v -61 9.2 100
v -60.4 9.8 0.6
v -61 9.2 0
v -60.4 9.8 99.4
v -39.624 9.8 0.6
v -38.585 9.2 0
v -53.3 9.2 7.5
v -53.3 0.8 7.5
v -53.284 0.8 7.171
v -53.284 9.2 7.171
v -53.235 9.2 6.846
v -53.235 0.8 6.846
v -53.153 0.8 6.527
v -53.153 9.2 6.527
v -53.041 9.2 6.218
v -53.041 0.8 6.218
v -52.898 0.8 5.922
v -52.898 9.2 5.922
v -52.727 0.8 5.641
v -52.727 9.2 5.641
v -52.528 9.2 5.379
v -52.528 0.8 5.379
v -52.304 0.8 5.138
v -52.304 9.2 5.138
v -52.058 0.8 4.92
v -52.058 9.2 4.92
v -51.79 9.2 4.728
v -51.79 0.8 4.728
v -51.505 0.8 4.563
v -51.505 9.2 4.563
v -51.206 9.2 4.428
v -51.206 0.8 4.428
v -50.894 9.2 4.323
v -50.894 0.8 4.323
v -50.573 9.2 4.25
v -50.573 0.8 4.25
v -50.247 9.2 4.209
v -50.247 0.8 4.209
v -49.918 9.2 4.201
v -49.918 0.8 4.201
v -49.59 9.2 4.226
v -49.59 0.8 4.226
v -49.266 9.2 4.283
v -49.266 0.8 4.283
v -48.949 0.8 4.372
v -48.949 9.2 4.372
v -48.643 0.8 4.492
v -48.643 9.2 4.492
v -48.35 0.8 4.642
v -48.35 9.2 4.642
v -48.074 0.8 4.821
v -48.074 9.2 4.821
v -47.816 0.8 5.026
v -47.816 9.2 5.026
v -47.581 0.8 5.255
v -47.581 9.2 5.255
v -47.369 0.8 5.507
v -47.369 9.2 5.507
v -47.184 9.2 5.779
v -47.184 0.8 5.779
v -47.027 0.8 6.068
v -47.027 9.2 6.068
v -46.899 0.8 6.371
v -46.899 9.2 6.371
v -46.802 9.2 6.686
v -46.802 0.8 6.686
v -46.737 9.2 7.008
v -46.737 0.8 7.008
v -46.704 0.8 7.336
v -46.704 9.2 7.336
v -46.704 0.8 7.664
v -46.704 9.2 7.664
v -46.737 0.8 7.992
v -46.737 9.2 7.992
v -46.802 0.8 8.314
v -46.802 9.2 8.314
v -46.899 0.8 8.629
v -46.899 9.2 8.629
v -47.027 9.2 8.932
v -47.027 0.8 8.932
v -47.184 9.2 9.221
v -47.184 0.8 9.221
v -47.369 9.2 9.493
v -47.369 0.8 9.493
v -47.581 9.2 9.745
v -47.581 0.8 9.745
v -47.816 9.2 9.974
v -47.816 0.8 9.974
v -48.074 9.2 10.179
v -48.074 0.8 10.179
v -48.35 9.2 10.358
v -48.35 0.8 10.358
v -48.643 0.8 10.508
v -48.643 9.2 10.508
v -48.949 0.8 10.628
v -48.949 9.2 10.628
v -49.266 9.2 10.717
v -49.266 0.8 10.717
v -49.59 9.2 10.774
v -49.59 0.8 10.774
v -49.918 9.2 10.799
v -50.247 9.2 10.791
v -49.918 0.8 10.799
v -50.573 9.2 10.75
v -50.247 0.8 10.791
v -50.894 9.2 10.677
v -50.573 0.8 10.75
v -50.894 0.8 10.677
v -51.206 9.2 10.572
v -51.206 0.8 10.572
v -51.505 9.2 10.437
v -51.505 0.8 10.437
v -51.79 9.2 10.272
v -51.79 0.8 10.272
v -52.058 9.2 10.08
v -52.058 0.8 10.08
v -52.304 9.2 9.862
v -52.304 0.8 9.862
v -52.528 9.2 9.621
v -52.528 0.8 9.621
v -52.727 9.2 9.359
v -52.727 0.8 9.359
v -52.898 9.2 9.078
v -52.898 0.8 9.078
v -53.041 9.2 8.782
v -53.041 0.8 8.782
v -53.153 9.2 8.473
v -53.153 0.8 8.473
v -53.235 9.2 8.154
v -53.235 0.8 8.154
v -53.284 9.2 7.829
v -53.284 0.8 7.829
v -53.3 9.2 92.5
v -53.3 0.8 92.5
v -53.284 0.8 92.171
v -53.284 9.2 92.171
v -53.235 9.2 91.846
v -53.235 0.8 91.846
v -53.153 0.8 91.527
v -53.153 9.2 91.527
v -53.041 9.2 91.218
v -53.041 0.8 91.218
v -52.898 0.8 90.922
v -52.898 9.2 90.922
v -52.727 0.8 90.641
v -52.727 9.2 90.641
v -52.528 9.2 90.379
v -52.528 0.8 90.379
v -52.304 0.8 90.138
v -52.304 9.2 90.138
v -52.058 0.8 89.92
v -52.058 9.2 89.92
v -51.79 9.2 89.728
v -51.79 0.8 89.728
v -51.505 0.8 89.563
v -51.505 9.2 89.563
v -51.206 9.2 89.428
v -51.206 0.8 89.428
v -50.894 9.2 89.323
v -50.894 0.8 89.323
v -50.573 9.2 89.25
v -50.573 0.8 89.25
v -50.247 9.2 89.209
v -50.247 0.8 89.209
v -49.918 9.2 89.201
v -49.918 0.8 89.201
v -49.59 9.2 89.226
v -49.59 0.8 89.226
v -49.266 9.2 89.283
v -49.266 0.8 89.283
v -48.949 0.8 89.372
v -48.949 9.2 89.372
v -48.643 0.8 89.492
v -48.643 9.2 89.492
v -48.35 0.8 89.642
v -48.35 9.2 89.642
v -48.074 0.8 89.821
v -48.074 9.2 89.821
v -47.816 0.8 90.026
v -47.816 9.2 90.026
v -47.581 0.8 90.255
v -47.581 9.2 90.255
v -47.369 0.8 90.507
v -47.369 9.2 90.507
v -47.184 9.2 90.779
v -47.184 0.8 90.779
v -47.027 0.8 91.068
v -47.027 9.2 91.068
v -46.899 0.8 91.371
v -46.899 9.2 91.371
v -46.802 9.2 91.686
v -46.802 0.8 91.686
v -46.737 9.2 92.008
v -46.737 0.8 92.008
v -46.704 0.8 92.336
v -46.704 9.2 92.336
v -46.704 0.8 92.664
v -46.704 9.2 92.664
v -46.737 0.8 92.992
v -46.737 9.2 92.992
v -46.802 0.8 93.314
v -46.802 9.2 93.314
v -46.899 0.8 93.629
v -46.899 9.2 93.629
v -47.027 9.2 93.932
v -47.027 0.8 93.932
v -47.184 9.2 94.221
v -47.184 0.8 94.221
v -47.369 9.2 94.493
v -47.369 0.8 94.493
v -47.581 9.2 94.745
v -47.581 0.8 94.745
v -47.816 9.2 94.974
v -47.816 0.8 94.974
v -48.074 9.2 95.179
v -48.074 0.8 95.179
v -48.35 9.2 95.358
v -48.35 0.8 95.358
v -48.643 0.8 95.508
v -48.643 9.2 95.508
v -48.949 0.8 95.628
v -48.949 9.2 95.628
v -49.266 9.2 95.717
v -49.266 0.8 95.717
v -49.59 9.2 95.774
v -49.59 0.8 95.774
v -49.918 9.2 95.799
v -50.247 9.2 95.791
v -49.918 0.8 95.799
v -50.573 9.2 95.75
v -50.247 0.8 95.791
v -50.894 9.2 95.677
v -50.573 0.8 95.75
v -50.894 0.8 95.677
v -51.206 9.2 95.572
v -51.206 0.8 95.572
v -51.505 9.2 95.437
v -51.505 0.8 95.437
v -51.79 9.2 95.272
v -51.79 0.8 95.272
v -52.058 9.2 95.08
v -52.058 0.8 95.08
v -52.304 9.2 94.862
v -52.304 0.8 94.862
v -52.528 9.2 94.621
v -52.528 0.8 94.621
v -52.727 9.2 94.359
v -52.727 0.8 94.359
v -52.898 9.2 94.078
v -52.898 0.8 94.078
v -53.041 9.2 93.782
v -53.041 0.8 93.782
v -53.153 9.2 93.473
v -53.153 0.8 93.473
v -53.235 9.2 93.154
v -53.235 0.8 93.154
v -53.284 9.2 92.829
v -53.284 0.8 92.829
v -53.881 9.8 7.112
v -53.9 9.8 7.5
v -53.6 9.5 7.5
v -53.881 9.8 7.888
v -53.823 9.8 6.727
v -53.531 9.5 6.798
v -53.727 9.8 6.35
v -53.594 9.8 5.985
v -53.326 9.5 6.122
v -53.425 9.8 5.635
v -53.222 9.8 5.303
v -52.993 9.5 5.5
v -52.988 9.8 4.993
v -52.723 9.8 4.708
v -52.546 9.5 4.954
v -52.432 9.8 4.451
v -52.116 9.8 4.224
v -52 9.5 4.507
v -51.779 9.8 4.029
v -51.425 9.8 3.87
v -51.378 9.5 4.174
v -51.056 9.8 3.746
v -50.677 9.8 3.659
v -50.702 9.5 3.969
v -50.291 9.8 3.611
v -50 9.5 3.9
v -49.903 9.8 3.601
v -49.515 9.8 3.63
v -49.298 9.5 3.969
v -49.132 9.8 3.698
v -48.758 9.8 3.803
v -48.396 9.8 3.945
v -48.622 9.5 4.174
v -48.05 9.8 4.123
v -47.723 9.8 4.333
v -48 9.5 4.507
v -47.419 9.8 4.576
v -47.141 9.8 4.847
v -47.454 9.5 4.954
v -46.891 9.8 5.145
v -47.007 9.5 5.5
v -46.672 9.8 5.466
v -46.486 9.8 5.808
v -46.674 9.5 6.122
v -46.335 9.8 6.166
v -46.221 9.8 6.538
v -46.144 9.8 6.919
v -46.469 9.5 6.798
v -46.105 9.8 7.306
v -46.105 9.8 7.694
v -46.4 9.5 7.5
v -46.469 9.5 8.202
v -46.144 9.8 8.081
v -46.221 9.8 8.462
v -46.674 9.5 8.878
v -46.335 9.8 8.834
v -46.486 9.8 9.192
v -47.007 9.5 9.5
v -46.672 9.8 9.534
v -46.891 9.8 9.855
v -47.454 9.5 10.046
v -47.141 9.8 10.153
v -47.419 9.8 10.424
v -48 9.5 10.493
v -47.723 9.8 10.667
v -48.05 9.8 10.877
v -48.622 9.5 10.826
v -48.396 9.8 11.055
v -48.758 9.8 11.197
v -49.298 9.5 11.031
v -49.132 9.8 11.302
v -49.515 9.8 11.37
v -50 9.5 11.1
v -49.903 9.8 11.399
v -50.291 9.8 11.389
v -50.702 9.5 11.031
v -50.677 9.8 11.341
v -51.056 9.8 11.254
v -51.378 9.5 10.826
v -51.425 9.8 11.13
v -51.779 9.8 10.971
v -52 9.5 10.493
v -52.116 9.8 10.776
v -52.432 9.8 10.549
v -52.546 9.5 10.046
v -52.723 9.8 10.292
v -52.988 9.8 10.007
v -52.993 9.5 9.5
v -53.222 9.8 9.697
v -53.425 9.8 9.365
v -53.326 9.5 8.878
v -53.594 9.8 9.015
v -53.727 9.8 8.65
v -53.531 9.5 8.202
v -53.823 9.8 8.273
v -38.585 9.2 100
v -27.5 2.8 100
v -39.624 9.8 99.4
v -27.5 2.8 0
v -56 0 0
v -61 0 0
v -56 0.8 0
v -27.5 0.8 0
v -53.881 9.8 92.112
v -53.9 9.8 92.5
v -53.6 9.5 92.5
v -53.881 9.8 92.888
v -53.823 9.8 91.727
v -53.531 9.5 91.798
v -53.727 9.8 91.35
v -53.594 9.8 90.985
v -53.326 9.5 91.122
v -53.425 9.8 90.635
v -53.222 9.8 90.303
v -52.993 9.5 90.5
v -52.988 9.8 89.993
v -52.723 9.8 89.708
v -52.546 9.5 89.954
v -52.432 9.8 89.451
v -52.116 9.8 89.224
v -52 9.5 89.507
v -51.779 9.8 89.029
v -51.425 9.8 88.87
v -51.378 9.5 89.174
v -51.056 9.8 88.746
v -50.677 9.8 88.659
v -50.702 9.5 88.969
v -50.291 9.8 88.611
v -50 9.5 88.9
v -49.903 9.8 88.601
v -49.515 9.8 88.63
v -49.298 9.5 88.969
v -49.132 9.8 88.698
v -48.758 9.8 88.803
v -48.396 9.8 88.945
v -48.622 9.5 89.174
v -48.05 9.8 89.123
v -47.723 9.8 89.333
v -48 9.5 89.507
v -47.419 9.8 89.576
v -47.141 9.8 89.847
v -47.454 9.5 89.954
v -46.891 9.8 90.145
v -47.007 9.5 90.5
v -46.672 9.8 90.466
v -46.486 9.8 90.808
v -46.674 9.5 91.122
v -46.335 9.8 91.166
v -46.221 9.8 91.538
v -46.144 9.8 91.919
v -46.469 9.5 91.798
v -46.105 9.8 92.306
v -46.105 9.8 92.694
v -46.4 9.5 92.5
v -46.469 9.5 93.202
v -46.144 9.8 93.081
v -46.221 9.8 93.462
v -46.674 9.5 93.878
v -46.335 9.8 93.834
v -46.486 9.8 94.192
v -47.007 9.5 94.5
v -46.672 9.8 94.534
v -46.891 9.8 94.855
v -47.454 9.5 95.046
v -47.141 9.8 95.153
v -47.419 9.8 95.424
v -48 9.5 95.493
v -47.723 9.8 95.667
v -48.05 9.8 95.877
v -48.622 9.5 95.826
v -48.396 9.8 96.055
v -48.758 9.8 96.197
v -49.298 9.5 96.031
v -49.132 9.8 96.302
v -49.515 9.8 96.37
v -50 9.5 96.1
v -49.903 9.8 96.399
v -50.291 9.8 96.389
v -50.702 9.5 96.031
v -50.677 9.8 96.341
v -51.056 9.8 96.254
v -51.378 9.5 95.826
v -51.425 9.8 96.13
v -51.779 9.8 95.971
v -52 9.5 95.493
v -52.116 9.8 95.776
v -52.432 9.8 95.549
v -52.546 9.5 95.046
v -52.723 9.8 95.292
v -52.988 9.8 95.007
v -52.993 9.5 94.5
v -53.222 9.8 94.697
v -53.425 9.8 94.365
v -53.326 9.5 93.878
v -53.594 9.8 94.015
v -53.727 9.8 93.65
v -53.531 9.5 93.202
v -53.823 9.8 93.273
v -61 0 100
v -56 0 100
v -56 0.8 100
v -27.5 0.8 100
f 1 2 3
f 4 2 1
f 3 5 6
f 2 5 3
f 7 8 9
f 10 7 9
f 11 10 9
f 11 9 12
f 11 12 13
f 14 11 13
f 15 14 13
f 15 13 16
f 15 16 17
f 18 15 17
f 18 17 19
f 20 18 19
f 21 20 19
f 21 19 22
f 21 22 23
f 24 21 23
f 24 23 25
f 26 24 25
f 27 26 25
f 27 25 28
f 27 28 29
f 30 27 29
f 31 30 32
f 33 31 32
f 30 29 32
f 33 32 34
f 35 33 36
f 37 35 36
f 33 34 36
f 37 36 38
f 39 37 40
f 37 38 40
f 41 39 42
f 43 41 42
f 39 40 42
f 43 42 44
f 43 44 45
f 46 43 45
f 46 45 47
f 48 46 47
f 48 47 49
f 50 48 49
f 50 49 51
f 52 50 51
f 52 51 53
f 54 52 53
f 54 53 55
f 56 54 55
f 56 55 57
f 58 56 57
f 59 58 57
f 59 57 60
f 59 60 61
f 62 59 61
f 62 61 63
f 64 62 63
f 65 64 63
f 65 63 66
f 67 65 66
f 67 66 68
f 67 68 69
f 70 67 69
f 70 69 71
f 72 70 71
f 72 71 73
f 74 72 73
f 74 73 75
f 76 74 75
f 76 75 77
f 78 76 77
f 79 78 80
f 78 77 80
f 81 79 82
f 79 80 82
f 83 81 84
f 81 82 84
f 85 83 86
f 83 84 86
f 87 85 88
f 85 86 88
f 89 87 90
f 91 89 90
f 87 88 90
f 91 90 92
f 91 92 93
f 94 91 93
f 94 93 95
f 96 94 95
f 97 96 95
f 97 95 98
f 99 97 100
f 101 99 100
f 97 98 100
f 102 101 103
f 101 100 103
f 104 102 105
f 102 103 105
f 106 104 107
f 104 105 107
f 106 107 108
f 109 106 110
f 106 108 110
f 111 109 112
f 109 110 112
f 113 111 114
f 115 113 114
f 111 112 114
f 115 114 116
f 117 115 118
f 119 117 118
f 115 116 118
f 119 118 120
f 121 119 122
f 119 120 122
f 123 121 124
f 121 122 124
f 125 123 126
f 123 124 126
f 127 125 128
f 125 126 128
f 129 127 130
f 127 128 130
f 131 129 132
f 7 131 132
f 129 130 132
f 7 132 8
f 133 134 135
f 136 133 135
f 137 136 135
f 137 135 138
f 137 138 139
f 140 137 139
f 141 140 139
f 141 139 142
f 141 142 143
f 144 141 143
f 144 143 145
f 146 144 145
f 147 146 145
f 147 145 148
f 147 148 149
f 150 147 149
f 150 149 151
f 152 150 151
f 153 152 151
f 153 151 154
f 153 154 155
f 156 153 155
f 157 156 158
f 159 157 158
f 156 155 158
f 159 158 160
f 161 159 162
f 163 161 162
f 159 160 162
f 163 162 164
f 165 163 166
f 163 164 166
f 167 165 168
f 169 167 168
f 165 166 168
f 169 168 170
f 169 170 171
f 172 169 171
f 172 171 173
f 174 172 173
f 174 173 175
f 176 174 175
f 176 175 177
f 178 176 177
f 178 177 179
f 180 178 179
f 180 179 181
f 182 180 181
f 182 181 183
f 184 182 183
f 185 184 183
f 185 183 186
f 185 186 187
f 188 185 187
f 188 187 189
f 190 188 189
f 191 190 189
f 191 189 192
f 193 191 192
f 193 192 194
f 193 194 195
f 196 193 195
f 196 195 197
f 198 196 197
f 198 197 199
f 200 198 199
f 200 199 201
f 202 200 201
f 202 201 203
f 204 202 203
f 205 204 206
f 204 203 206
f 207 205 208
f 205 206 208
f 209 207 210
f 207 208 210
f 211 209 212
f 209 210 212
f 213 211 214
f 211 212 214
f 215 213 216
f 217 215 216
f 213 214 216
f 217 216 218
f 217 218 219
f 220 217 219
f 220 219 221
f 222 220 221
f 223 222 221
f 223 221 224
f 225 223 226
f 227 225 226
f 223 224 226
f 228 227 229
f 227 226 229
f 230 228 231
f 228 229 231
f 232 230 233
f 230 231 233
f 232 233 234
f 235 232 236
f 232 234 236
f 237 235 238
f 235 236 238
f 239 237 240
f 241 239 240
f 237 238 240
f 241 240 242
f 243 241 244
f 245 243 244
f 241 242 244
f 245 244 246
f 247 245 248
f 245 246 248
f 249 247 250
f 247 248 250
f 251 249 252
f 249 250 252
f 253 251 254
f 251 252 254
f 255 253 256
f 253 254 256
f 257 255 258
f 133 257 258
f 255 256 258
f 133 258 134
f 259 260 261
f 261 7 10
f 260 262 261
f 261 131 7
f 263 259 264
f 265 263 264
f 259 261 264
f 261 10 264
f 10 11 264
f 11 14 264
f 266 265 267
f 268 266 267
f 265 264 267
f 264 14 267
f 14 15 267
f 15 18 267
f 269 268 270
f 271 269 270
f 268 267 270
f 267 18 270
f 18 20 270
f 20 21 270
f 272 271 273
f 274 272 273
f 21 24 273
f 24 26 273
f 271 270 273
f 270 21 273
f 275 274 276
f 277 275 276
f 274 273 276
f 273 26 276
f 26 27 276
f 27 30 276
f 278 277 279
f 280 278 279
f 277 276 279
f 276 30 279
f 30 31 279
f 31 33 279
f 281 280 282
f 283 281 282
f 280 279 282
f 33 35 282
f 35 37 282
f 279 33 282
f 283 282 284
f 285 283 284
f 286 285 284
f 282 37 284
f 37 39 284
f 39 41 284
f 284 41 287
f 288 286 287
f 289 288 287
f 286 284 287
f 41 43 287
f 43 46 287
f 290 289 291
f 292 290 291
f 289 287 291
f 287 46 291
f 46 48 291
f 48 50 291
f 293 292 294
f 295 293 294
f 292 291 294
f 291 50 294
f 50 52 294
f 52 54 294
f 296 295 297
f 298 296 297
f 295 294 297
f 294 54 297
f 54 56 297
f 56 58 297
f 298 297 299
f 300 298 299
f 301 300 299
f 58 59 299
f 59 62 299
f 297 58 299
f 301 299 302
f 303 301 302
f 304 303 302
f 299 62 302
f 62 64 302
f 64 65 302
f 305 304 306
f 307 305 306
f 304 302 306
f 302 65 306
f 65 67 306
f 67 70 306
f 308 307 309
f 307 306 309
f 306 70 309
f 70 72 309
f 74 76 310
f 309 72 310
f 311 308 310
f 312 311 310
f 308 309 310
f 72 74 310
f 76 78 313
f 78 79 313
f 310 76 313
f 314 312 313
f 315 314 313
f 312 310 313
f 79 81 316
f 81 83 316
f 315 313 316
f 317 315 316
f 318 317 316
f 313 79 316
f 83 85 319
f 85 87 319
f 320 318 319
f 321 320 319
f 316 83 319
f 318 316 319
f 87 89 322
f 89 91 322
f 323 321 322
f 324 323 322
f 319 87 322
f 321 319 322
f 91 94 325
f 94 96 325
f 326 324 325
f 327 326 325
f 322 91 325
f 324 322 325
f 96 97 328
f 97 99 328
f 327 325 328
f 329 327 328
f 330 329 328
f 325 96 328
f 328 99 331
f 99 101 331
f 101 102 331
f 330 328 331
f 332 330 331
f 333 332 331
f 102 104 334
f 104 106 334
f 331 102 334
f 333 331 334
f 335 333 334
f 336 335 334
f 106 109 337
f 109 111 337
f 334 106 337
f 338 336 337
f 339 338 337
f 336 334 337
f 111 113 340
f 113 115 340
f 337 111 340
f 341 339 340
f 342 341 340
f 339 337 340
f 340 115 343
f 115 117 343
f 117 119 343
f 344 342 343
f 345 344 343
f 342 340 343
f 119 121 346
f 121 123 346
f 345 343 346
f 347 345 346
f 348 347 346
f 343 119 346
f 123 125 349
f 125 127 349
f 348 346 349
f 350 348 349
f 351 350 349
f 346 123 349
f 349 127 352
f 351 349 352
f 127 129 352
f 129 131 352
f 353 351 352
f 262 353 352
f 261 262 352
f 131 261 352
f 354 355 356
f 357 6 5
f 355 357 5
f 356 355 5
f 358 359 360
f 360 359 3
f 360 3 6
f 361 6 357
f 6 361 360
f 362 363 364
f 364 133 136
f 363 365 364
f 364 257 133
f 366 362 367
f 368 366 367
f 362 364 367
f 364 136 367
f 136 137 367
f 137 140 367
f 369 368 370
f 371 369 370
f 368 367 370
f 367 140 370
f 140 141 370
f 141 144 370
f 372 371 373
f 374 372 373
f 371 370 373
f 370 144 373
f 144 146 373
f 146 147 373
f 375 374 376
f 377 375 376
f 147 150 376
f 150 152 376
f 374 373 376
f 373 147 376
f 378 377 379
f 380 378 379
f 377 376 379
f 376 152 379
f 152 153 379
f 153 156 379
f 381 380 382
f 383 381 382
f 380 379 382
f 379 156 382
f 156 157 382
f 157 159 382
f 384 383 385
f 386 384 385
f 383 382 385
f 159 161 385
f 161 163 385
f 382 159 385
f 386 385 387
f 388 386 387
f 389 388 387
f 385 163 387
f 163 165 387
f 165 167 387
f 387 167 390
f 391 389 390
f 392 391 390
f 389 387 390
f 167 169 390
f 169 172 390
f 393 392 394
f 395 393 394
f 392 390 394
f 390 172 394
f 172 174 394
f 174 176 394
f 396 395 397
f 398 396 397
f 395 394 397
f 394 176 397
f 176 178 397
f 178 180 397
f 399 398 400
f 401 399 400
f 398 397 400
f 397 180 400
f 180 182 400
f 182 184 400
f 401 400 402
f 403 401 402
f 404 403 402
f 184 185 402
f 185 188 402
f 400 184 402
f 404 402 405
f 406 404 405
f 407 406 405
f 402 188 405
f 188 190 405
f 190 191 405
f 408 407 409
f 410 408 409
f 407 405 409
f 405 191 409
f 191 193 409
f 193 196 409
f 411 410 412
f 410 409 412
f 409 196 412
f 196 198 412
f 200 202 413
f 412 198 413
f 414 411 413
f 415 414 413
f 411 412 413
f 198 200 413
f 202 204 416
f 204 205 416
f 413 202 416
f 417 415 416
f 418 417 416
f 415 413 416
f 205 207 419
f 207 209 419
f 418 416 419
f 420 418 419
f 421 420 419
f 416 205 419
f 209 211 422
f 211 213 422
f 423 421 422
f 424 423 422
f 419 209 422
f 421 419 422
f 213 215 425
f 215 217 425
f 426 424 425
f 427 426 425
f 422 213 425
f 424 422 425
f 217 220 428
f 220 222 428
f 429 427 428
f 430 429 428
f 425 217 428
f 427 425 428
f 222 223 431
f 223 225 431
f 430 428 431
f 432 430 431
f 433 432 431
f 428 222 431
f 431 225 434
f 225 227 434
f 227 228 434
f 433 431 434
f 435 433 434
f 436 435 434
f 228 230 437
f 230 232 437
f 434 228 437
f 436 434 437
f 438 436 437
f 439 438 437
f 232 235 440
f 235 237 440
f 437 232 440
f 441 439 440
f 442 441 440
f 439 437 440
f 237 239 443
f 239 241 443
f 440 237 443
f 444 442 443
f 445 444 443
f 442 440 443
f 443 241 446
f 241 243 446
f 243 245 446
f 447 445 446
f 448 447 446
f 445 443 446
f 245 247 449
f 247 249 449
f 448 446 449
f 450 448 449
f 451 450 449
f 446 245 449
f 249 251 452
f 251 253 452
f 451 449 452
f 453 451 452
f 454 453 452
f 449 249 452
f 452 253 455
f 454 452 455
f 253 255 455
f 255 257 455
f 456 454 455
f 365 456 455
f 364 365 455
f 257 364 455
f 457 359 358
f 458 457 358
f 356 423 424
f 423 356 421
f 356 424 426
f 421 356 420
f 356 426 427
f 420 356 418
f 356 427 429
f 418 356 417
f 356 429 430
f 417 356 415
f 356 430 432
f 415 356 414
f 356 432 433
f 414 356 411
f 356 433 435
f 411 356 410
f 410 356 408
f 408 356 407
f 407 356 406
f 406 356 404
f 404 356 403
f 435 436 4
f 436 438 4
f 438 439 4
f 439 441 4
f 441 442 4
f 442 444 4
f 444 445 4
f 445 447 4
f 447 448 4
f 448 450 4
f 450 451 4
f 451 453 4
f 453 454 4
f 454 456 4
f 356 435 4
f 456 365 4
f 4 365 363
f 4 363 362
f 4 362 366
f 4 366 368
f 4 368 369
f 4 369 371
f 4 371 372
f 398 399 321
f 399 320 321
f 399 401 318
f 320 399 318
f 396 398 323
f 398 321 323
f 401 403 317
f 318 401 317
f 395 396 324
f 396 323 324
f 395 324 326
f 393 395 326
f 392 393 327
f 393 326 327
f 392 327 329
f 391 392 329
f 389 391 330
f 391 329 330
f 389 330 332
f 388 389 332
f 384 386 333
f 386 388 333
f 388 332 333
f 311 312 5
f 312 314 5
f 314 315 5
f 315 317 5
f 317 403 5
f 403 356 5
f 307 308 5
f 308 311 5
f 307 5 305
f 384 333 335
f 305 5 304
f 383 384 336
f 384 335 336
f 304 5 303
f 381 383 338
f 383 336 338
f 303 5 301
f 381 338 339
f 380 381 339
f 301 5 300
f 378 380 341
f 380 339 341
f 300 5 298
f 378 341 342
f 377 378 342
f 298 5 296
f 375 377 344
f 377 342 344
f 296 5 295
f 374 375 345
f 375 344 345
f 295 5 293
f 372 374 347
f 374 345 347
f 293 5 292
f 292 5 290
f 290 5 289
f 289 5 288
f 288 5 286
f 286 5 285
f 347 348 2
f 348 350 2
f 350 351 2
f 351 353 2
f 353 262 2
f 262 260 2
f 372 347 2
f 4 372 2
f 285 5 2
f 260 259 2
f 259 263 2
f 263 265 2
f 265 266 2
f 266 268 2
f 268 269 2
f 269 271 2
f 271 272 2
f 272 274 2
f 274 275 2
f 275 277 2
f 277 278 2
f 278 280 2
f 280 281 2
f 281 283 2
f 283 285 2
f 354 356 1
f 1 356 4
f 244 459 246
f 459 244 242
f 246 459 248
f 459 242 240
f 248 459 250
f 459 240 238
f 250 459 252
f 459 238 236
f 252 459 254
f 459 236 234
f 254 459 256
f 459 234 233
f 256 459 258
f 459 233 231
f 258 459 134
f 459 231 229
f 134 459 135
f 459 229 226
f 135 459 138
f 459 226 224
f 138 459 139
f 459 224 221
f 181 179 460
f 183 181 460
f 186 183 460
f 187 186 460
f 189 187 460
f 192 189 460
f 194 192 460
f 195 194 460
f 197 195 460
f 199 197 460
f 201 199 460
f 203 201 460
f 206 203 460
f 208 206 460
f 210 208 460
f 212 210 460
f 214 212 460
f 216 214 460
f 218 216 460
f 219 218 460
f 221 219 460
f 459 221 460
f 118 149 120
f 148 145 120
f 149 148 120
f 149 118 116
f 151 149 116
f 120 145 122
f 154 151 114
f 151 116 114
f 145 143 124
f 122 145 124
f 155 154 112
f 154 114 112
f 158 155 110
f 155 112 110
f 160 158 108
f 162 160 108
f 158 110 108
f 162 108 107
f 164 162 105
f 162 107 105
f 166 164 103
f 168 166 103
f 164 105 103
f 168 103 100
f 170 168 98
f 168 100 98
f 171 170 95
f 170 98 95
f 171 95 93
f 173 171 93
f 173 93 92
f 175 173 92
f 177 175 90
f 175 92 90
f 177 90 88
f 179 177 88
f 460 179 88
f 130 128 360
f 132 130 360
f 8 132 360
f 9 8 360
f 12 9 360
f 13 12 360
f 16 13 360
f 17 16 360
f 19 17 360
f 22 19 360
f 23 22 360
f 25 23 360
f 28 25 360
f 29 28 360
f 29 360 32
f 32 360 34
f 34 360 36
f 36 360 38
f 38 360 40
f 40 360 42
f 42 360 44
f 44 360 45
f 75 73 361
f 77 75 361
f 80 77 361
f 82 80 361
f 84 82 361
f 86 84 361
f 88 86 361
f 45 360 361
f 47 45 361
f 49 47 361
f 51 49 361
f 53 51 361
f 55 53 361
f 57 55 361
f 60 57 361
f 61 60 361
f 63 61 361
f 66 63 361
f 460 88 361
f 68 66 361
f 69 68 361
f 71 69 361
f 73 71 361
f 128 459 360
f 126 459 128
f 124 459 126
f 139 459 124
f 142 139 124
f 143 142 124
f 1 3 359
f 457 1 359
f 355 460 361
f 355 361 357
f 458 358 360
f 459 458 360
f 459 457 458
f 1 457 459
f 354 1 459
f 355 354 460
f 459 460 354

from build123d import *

# Parameters (mm, degrees)
BOSS_EXTRUDE1_DEPTH  = 100
M6_CLEARANCE_HOLE2_D = 6.6
CHAMFER1_SIZE        = 0.6


with BuildPart() as part:
    # Sketch1 → Boss-Extrude1 (new body)
    with BuildSketch(Plane.XY):
        Polygon((-61, 0), (-56, 0), (-56, 0.8), (-27.5, 0.8), (-27.5, 2.8), (-39.624355653, 9.8), (-61, 9.8), align=None)
    extrude(amount=BOSS_EXTRUDE1_DEPTH)

    # M6 Clearance Hole2 (through all)
    with Locations(Plane(origin=(0, 9.8, 0), x_dir=(1, 0, 0), z_dir=(0, 1, 0))):
        with Locations((-50, -92.5), (-50, -7.5)):
            Hole(M6_CLEARANCE_HOLE2_D / 2)

    # Chamfer1
    chamfer1_edges = [part.edges().sort_by_distance(p)[0] for p in [
        (-61, 9.8, 50),
        (-46.7, 9.8, 92.5),
        (-50.312177826, 9.8, 100),
        (-46.7, 9.8, 7.5),
        (-50.312177826, 9.8, 0),
    ]]
    chamfer(chamfer1_edges, length=CHAMFER1_SIZE)


solid = part.part
